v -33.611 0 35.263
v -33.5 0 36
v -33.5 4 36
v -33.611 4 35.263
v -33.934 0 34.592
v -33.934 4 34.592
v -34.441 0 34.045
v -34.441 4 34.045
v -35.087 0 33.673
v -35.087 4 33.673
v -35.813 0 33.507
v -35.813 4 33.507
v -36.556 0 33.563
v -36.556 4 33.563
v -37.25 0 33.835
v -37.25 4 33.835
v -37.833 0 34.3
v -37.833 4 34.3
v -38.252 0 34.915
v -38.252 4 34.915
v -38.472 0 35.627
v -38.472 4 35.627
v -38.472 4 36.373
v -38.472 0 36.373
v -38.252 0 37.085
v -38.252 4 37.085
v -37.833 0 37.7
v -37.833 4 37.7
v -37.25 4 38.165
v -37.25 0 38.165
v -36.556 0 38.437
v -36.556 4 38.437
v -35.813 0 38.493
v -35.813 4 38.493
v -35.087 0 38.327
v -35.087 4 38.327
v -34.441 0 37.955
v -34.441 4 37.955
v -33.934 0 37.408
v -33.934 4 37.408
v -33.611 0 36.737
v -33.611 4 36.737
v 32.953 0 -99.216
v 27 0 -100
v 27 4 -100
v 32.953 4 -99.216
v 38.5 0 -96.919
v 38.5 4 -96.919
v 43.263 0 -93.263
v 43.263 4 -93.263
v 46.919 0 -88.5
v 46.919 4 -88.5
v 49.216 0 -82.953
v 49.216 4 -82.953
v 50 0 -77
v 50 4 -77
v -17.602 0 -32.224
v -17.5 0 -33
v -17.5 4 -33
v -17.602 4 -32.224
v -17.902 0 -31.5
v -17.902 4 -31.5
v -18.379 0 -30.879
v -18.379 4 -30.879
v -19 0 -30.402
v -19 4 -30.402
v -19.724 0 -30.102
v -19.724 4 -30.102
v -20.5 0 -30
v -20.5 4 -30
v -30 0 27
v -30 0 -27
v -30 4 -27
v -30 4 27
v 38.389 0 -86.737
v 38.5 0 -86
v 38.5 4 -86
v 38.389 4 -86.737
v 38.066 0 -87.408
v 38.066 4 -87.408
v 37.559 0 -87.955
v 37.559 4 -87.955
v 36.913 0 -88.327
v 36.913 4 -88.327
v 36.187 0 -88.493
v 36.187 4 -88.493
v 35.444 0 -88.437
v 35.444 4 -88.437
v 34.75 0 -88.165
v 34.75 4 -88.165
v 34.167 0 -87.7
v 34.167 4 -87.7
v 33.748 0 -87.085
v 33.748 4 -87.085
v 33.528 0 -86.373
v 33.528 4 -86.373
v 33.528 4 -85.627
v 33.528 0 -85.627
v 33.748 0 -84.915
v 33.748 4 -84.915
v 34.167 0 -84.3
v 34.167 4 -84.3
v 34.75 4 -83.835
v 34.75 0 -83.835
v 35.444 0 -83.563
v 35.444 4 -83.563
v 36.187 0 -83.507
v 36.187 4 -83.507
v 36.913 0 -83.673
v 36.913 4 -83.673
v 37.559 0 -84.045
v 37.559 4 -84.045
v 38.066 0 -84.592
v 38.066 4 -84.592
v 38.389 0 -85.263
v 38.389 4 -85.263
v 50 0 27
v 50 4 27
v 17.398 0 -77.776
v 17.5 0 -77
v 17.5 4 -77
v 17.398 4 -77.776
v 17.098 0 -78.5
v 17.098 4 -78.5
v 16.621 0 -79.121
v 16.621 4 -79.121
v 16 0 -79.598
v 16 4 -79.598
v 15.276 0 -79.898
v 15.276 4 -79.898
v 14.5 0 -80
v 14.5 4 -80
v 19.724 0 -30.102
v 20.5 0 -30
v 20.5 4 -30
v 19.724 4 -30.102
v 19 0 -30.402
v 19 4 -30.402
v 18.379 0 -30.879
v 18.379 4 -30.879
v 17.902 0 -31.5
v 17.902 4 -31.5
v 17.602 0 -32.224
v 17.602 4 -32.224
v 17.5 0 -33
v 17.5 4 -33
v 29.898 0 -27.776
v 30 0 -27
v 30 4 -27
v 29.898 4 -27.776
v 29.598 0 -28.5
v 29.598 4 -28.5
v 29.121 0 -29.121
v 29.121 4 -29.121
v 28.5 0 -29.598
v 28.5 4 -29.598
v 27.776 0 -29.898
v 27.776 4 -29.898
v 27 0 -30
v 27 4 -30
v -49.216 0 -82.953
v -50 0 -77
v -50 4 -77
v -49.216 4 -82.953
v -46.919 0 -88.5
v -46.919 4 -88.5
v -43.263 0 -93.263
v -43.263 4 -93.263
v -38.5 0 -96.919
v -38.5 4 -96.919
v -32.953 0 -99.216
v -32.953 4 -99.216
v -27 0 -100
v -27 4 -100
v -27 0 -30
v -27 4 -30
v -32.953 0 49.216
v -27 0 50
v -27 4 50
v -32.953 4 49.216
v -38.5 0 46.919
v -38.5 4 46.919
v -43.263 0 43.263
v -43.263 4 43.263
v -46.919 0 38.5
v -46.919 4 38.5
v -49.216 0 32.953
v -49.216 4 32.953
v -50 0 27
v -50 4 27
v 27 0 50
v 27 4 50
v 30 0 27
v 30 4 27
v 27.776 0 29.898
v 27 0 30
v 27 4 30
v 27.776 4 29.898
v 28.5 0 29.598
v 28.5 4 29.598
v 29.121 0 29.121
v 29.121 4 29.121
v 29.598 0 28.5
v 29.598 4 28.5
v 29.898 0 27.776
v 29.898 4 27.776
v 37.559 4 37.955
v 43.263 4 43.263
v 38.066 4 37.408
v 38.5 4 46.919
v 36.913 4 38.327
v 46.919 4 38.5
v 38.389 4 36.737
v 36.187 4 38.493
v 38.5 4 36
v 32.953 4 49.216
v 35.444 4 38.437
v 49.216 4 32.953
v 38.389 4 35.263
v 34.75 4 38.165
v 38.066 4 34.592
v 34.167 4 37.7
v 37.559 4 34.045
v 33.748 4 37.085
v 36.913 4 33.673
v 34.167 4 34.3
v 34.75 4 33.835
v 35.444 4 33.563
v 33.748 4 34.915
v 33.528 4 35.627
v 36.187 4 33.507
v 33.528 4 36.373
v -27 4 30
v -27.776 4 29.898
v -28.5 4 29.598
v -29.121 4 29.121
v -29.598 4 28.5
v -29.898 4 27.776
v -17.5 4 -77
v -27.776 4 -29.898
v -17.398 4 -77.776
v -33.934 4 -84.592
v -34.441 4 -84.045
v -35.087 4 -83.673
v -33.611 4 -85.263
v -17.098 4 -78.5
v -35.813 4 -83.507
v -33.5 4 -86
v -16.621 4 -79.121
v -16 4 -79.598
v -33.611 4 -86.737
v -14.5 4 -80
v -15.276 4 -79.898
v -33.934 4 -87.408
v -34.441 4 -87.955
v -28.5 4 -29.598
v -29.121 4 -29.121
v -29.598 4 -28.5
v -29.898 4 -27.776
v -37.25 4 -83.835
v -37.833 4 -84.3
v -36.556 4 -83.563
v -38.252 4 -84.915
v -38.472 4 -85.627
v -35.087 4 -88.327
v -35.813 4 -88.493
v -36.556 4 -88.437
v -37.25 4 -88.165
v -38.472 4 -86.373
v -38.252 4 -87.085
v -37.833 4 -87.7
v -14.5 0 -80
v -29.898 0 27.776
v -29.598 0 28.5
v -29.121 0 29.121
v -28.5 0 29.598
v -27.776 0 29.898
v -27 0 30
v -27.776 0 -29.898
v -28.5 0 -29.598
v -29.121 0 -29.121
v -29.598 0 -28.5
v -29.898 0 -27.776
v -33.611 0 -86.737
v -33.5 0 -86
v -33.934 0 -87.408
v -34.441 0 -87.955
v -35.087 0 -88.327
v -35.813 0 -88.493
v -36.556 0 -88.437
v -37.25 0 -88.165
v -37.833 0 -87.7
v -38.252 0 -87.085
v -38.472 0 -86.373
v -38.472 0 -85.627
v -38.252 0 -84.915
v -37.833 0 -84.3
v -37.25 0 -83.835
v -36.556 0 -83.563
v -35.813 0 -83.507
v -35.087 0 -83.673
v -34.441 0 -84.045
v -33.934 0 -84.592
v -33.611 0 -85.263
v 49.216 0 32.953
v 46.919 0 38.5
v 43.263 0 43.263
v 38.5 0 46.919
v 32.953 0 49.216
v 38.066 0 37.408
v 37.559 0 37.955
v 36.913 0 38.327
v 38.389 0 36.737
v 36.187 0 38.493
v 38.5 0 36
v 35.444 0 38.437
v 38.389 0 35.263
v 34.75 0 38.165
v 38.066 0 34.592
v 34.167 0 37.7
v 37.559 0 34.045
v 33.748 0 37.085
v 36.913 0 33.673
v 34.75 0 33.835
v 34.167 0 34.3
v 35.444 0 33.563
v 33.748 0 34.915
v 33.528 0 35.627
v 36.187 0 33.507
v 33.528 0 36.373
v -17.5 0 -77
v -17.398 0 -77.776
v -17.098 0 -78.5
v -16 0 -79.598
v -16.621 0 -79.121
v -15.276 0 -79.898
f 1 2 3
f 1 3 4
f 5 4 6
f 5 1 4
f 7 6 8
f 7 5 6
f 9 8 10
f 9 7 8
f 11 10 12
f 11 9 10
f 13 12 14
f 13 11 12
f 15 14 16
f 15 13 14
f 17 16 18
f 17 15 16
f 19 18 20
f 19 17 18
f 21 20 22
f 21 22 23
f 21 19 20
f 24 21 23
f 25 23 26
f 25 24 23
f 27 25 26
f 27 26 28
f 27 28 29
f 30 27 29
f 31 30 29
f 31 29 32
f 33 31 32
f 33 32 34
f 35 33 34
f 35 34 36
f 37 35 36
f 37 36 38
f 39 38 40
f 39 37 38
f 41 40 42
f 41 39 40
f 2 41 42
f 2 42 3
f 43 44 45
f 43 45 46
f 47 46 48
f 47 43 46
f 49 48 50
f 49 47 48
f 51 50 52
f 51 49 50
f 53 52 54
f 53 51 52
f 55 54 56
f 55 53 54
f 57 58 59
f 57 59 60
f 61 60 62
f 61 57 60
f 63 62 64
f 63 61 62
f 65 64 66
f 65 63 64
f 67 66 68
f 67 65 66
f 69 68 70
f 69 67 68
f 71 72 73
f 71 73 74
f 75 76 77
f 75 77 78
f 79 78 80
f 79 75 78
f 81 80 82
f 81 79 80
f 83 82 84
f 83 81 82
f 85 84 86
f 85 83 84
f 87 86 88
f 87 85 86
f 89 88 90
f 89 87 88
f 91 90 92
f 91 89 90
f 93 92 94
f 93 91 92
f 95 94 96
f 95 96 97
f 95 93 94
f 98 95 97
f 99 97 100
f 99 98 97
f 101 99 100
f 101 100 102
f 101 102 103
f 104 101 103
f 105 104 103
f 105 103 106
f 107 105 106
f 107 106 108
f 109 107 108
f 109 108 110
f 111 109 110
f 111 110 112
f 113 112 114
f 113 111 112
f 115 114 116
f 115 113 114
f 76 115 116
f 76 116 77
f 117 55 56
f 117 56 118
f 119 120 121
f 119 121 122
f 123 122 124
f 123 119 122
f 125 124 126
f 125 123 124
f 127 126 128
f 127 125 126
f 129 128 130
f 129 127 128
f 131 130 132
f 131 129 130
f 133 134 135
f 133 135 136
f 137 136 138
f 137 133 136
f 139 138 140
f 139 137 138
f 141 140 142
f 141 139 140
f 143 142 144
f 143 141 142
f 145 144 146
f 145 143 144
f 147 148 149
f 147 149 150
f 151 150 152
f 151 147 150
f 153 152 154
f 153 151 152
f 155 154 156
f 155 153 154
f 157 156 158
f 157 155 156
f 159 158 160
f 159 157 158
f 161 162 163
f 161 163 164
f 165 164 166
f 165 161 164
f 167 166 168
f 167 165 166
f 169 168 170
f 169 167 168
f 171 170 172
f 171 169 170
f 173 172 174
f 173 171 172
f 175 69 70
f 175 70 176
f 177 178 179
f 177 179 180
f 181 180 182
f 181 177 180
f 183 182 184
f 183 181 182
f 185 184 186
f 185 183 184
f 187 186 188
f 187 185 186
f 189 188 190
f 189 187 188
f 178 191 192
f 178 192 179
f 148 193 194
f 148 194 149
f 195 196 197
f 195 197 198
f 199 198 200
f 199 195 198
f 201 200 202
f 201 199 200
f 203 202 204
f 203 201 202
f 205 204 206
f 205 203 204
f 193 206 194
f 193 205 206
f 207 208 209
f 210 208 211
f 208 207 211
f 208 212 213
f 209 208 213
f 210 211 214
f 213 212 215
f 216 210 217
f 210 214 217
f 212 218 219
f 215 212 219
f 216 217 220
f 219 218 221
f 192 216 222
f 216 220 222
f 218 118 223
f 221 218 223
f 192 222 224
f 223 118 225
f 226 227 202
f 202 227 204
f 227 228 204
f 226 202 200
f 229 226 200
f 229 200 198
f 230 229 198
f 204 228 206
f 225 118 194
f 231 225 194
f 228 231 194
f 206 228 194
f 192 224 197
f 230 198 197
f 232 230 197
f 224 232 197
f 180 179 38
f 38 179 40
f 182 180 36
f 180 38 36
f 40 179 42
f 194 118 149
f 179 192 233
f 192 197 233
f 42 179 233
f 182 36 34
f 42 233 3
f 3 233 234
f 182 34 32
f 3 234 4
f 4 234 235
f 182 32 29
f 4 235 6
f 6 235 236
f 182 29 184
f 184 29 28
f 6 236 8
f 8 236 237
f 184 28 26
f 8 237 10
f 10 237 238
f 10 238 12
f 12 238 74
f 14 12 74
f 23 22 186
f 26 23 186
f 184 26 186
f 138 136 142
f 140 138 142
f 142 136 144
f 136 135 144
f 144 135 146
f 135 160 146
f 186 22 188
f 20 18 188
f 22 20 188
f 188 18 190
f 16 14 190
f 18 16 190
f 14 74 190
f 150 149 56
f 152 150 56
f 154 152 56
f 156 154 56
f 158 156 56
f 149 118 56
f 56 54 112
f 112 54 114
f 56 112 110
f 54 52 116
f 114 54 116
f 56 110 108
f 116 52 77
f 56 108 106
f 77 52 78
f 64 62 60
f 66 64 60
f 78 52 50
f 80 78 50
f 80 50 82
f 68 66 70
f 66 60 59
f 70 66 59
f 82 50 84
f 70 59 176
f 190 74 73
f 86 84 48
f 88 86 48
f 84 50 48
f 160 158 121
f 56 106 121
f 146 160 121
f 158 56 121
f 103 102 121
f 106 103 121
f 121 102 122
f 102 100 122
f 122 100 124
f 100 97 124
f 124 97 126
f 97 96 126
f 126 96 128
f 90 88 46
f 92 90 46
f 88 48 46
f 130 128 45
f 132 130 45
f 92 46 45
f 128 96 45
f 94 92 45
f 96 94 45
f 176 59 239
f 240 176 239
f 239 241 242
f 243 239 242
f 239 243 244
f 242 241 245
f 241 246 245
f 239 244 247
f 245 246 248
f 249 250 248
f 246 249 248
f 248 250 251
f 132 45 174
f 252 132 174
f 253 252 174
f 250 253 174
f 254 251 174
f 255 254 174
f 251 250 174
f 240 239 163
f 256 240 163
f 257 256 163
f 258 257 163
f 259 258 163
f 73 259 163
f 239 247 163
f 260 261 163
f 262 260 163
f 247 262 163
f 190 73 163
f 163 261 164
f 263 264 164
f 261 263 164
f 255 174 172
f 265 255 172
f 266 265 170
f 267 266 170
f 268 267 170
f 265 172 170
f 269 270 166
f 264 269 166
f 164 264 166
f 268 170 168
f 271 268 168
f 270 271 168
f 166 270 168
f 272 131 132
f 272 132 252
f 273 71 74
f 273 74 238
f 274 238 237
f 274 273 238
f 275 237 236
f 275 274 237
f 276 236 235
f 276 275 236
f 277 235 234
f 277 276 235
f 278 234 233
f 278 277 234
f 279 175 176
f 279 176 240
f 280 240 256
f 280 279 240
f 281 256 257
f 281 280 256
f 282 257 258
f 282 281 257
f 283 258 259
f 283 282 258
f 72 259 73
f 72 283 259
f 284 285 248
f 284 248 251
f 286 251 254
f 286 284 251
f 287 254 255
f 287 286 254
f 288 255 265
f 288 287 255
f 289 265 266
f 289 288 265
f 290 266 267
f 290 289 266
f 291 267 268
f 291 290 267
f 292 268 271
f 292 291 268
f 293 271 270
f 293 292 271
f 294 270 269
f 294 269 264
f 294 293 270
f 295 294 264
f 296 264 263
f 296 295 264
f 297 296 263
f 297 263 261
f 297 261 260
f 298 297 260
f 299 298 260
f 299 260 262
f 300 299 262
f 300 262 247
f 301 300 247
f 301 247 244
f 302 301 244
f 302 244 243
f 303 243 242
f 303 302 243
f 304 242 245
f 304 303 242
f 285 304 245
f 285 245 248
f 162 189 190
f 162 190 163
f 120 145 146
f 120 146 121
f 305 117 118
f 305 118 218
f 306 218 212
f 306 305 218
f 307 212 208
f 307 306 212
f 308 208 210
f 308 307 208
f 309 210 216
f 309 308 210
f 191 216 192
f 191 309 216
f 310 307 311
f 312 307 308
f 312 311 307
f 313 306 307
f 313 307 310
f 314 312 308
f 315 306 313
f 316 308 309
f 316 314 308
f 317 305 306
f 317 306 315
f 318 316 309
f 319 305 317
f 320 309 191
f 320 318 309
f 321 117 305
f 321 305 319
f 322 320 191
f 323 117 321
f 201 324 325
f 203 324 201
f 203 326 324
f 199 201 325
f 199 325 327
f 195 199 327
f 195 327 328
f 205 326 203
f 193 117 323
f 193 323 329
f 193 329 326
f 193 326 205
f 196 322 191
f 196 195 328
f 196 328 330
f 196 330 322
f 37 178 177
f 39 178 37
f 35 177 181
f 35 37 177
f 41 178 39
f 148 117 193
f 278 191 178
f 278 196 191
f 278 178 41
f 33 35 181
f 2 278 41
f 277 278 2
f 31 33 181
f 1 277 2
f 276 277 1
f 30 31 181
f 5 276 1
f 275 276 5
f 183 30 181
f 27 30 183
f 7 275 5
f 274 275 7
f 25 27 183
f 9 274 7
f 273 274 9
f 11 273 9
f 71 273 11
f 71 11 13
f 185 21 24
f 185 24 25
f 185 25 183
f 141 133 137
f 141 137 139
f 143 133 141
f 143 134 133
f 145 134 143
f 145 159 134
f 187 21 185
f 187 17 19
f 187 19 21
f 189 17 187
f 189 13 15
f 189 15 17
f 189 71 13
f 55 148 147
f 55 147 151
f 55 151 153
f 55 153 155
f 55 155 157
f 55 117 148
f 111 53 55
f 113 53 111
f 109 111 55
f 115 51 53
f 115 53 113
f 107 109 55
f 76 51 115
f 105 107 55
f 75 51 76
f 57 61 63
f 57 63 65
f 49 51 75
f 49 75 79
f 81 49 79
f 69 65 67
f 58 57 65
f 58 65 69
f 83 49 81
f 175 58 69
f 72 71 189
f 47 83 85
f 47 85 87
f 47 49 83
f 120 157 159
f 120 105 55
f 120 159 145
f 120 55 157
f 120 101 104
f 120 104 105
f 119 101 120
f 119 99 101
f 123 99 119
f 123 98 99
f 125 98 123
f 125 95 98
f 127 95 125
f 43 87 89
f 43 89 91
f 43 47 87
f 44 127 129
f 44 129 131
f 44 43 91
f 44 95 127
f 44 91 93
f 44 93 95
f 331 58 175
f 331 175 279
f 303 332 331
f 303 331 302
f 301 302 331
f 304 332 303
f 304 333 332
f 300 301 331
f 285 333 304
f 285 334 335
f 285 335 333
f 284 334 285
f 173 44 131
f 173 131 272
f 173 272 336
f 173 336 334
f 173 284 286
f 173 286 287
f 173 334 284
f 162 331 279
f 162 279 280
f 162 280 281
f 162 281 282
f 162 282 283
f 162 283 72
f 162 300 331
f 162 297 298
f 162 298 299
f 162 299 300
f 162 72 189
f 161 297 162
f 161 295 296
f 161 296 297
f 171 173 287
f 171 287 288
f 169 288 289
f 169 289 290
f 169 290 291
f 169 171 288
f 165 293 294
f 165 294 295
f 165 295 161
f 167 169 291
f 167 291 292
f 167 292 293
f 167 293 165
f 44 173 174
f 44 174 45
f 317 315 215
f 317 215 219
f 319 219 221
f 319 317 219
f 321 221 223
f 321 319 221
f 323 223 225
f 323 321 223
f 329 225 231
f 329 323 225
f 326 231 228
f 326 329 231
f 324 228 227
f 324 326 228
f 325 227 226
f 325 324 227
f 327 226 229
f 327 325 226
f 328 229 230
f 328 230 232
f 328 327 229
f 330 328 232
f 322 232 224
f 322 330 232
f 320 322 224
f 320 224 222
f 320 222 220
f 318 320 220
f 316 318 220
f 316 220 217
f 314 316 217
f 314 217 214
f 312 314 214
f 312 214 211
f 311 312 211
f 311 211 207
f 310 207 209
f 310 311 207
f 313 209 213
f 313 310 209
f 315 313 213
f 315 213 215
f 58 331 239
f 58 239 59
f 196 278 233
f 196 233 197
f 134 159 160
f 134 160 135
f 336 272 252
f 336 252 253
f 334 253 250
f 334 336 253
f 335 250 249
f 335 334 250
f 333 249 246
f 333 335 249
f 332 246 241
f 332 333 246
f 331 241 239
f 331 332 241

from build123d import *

# Parameters (mm, degrees)
SKETCH1_R           = 2.5
BOSS_EXTRUDE2_DEPTH = 4


with BuildPart() as part:
    # Sketch1 → Boss-Extrude2 (new body)
    with BuildSketch(Plane(origin=(0, 0, 0), x_dir=(1, 0, 0), z_dir=(0, 1, 0))):
        with BuildLine():
            Line((-50, -27), (-50, 77))
            ThreePointArc((-50, 77), (-43.263455967, 93.263455967), (-27, 100))
            Line((-27, 100), (27, 100))
            ThreePointArc((27, 100), (43.263455967, 93.263455967), (50, 77))
            Line((50, 77), (50, -27))
            ThreePointArc((50, -27), (43.263455967, -43.263455967), (27, -50))
            Line((27, -50), (-27, -50))
            ThreePointArc((-27, -50), (-43.263455967, -43.263455967), (-50, -27))
        make_face()
        with Locations((-36, -36)):
            Circle(SKETCH1_R, mode=Mode.SUBTRACT)
        with Locations((-36, 86)):
            Circle(SKETCH1_R, mode=Mode.SUBTRACT)
        with Locations((36, -36)):
            Circle(SKETCH1_R, mode=Mode.SUBTRACT)
        with Locations((36, 86)):
            Circle(SKETCH1_R, mode=Mode.SUBTRACT)
        with BuildLine():
            Line((-27, -30), (27, -30))
            ThreePointArc((27, -30), (29.121320344, -29.121320344), (30, -27))
            Line((30, -27), (30, 27))
            ThreePointArc((30, 27), (29.121320344, 29.121320344), (27, 30))
            Line((27, 30), (20.5, 30))
            ThreePointArc((20.5, 30), (18.378679656, 30.878679656), (17.5, 33))
            Line((17.5, 33), (17.5, 77))
            ThreePointArc((17.5, 77), (16.621320344, 79.121320344), (14.5, 80))
            Line((14.5, 80), (-14.5, 80))
            ThreePointArc((-14.5, 80), (-16.621320344, 79.121320344), (-17.5, 77))
            Line((-17.5, 77), (-17.5, 33))
            ThreePointArc((-17.5, 33), (-18.378679656, 30.878679656), (-20.5, 30))
            Line((-20.5, 30), (-27, 30))
            ThreePointArc((-27, 30), (-29.121320344, 29.121320344), (-30, 27))
            Line((-30, 27), (-30, -27))
            ThreePointArc((-30, -27), (-29.121320344, -29.121320344), (-27, -30))
        make_face(mode=Mode.SUBTRACT)
    extrude(amount=BOSS_EXTRUDE2_DEPTH)


solid = part.part
